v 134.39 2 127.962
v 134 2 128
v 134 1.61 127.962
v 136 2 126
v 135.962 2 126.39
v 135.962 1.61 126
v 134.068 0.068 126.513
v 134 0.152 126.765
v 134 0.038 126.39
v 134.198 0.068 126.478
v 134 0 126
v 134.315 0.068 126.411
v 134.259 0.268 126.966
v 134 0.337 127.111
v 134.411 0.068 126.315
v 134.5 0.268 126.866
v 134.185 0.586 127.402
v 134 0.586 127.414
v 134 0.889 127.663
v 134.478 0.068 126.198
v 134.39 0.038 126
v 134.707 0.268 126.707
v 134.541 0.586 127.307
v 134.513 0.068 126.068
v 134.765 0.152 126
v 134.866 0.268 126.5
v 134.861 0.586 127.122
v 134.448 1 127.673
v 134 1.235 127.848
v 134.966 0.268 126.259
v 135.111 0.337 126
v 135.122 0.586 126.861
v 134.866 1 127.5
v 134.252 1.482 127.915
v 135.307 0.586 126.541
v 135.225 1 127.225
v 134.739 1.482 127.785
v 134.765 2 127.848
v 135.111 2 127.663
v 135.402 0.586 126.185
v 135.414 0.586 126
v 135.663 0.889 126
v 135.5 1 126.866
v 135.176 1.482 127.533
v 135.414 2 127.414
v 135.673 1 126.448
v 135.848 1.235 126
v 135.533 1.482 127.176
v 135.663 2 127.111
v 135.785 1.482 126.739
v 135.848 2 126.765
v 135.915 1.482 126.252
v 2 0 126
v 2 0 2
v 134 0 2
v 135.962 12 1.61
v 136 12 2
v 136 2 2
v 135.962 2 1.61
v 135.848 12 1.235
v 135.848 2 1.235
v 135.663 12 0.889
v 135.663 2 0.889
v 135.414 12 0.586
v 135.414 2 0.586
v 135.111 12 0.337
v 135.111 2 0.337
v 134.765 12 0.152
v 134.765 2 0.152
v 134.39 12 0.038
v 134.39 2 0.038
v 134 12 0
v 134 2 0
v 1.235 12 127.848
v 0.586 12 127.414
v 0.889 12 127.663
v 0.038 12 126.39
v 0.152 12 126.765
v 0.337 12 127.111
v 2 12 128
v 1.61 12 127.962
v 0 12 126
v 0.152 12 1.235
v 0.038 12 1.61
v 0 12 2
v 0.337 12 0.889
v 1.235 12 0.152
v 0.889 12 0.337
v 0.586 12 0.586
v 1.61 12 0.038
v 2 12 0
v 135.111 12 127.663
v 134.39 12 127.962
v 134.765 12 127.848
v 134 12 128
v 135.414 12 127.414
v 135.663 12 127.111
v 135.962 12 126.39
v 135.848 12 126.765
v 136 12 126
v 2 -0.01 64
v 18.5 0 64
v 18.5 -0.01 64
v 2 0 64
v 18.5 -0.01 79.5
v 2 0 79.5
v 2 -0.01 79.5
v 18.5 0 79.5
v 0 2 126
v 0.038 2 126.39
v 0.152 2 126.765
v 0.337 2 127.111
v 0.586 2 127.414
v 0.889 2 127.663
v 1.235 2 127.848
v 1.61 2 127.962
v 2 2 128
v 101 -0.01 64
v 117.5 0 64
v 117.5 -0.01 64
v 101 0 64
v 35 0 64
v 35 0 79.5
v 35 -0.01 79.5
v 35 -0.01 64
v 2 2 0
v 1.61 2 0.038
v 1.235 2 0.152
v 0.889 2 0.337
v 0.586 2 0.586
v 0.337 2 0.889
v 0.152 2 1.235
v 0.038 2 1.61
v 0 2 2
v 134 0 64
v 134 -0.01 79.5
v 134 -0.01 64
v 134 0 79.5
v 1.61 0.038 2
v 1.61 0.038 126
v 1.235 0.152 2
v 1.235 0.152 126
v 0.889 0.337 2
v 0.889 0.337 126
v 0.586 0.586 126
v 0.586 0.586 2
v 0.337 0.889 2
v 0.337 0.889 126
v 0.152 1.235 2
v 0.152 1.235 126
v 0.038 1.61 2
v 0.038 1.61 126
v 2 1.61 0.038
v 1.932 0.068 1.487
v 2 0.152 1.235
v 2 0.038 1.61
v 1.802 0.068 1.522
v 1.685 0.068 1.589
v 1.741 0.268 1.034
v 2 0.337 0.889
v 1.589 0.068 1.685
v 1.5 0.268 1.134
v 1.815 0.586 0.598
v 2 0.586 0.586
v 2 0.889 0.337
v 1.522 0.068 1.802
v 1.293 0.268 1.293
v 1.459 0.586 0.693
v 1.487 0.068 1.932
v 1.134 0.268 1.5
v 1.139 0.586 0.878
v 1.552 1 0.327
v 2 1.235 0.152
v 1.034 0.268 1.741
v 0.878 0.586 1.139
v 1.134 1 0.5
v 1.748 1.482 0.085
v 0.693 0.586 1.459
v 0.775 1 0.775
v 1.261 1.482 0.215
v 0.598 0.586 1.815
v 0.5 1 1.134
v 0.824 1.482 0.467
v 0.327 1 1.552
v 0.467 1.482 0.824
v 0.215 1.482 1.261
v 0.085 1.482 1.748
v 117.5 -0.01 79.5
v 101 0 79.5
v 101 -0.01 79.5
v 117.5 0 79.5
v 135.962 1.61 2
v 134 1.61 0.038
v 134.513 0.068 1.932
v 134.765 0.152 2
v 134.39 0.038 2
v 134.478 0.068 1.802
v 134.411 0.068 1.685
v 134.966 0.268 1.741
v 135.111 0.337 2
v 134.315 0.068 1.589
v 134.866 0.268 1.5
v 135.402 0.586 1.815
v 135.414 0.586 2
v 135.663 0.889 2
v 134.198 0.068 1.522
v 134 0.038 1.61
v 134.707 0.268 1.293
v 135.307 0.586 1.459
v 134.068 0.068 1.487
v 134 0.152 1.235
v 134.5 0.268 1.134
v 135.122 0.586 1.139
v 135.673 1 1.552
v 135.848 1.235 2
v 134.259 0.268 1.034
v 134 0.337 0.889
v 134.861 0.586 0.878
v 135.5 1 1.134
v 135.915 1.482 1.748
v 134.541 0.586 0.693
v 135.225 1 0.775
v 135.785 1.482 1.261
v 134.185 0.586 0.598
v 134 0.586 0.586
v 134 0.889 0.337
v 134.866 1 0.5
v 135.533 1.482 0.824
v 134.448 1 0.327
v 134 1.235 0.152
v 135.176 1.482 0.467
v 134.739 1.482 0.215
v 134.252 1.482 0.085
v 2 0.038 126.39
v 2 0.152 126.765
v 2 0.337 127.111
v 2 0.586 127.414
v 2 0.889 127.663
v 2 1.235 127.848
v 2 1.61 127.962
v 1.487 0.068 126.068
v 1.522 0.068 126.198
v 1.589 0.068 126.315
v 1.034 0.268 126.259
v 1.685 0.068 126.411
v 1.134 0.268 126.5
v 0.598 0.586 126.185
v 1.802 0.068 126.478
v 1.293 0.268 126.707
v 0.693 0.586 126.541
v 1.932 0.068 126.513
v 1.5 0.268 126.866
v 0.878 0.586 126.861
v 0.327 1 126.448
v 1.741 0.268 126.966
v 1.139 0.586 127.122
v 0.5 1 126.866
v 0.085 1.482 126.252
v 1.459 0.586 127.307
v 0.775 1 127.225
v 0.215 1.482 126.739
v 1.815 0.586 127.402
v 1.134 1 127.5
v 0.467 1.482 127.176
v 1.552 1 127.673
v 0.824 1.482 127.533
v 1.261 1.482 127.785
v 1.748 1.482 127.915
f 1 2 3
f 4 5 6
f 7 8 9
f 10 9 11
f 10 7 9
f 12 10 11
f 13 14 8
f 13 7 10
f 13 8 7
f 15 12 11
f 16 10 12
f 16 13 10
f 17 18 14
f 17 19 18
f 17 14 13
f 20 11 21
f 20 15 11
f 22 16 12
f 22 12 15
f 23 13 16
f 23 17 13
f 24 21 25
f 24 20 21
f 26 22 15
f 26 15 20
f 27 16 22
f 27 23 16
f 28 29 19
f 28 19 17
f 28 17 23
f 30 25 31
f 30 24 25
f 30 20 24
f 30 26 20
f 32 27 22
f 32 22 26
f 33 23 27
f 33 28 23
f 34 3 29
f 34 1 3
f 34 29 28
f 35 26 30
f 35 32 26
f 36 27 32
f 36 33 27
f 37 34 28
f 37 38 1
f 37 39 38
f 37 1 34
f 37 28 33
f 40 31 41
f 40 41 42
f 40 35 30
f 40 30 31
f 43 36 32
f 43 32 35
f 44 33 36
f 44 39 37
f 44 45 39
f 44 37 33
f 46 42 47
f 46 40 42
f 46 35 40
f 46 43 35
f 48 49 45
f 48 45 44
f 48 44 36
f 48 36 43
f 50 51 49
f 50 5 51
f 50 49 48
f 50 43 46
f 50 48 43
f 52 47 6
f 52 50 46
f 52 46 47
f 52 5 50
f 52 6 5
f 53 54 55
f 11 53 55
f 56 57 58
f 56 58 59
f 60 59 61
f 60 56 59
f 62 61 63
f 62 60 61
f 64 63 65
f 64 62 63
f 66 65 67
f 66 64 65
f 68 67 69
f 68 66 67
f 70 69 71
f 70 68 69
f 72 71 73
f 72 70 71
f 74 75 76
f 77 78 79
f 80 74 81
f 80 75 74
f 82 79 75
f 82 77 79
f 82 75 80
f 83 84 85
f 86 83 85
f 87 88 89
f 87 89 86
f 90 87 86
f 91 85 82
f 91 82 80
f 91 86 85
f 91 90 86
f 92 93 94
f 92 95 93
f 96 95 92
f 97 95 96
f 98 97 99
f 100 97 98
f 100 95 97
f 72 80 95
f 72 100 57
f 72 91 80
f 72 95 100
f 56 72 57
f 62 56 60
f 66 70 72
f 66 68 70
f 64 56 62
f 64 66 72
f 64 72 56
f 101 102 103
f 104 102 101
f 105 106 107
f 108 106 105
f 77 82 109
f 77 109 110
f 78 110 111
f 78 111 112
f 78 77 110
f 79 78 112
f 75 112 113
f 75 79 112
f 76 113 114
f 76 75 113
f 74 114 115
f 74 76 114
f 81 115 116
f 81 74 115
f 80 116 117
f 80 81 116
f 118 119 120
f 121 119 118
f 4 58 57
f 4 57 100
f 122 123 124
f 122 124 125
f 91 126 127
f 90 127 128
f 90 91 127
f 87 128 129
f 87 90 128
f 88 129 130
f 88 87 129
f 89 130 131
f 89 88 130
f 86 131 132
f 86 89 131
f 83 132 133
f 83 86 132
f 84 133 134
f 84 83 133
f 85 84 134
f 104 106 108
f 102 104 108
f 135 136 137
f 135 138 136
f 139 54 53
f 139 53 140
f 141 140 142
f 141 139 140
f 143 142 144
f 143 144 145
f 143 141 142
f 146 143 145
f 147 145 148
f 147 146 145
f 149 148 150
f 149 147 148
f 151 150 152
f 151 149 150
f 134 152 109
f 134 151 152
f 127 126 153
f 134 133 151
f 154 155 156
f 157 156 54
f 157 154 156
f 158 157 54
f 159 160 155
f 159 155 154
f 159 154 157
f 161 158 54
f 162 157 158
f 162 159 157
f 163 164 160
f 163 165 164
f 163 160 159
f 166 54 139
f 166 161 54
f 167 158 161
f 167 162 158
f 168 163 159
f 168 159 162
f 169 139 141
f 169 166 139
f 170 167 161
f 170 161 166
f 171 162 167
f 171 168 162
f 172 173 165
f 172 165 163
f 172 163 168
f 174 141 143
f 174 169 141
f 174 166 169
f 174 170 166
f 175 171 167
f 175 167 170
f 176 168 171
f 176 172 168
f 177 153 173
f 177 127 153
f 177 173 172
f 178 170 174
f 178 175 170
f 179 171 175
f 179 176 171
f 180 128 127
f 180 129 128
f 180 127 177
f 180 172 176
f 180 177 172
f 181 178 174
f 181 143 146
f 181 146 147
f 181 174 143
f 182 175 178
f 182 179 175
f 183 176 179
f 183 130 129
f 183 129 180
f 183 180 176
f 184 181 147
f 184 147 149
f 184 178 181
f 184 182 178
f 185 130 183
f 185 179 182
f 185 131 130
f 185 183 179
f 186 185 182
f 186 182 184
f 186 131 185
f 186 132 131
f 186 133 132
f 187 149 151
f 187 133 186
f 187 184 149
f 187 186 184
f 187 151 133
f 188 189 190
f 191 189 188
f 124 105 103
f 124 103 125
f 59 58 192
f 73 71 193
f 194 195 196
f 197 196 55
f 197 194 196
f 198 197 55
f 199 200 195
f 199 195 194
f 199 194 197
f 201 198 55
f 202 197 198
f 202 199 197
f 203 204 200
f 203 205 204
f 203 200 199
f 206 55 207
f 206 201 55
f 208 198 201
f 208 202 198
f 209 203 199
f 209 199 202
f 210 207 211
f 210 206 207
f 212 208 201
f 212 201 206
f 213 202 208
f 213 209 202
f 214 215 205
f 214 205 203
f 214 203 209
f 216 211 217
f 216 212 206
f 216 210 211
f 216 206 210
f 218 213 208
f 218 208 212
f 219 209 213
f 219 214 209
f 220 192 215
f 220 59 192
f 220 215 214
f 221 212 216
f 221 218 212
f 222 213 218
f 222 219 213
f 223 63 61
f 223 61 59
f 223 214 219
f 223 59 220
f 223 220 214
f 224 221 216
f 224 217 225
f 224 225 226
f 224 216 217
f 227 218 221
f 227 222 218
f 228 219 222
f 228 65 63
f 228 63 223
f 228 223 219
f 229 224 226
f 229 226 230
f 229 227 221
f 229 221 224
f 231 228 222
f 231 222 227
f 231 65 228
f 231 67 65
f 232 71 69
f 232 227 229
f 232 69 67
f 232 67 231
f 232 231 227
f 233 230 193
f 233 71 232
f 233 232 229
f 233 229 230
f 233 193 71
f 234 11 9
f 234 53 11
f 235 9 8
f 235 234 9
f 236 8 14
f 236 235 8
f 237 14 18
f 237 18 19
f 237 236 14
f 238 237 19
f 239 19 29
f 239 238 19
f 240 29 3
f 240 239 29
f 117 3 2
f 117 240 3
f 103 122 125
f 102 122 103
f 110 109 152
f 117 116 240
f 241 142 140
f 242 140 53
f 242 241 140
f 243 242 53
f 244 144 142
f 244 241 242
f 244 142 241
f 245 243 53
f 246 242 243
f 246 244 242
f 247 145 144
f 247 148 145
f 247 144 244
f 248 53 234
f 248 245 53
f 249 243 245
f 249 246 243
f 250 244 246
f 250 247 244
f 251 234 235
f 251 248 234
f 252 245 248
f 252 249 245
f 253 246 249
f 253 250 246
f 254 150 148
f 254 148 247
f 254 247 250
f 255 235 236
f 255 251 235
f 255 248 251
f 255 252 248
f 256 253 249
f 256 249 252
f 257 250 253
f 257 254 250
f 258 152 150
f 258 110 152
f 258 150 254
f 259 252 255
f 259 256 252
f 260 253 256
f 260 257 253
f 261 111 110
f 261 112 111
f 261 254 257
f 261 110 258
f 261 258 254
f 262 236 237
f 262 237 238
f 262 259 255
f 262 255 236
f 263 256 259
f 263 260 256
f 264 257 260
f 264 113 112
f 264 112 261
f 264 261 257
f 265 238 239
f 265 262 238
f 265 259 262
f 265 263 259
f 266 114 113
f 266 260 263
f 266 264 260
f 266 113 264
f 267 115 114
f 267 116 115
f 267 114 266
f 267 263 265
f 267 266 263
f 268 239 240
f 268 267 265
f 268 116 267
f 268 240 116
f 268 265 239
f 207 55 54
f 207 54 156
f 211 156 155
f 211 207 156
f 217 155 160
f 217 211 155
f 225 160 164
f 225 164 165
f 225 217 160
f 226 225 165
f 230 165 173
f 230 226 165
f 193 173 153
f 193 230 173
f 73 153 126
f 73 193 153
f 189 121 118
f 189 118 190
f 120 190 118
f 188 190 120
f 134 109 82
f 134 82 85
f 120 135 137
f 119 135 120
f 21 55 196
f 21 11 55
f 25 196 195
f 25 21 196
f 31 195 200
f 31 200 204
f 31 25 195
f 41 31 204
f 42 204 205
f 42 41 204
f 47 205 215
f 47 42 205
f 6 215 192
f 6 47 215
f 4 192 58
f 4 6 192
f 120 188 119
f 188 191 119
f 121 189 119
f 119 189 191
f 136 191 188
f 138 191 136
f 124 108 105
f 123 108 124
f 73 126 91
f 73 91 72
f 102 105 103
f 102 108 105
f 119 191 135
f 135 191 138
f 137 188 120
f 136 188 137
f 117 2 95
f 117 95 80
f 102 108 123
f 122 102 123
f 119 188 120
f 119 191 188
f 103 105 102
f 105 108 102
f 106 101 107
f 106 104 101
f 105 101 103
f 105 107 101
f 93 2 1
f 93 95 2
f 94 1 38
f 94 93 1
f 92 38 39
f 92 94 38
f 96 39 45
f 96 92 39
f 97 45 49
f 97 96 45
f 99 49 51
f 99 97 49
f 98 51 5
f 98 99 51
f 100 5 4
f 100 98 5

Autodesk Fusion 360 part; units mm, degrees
sketch "Front Face Plate" plane through (0, 0, 0) normal (0, 1, 0) x (1, 0, 0)
  line L0 (0, 0) -> (136, 0)
  line L1 (136, 0) -> (136, -128)
  line L2 (136, -128) -> (0, -128)
  line L3 (0, -128) -> (0, 0)
  dimension "d5" = 136
  dimension "d6" = 128
extrude "Extrude1" add sketch "Front Face Plate" along normal blind 12 makes body 1
sketch "Eyes" plane through (0, 0, 0) normal (0, -1, 0) x (1, 0, 0)
  line L0 (136, 128) -> (0, 128)
  line L1 (0, 128) -> (0, 0)
  line L2 (0, 0) -> (136, 0)
  line L3 (136, 0) -> (136, 128)
  line L4 (2, 79.5) -> (18.5, 79.5)
  line L5 (18.5, 79.5) -> (18.5, 64)
  line L6 (18.5, 64) -> (2, 64)
  line L7 (2, 64) -> (2, 79.5)
  line L8 (18.5, 79.5) -> (35, 79.5)
  line L9 (35, 79.5) -> (35, 64)
  line L10 (35, 64) -> (18.5, 64)
  line L11 (18.5, 64) -> (18.5, 79.5)
  line L12 (101, 79.5) -> (117.5, 79.5)
  line L13 (117.5, 79.5) -> (117.5, 64)
  line L14 (117.5, 64) -> (101, 64)
  line L15 (101, 64) -> (101, 79.5)
  line L16 (117.5, 79.5) -> (134, 79.5)
  line L17 (134, 79.5) -> (134, 64)
  line L18 (134, 64) -> (117.5, 64)
  line L19 (117.5, 64) -> (117.5, 79.5)
  dimension "d10" = 16.5
  dimension "d11" = 16.5
  dimension "d12" = 16.5
  dimension "d13" = 16.5
  dimension "d14" = 15.5
  dimension "d15" = 15.5
  dimension "d16" = 48.5
  dimension "d17" = 48.5
  dimension "d23" = 2
  dimension "d24" = 2
extrude "Extrude2" add sketch "Eyes" along normal blind 0.01 separate body contours L4 L5 L6 L7 L11 | L13 L16 L17 L18 L19 makes body 2 at (7.5, 0, 74.3333) makes body 3 at (128.5, 0, 69.1667)
extrude "Extrude3" add sketch "Eyes" along normal blind 0.01 separate body contours L5 L8 L9 L10 L11 | L12 L13 L14 L15 L19 makes body 4 at (24, 0, 74.3333) makes body 5 at (106.5, 0, 69.1667)
fillet "Fillet1" radius 2 8 edges at (136, 6, 128) (0, 6, 128) (136, 6, 0) (0, 6, 0) (68, 0, 0) (0, 0, 64) (68, 0, 128) (136, 0, 64) on bodies 1
equation "block_size = 16 mm" comment "The size of the blocks used for the dimensions of the Minecraft Pig."
equation "pine_thickness = 12 mm" comment "The thickness of the pine boards used for the Minecraft Pig's body."
equation "front_face_plate_height = 8 * block_size" comment "The height of the Front Face Plate that makes up the Minecraft Pig's face."
equation "front_face_plate_width = 10 * block_size - 2 * pine_thickness" comment "The width of the Front Face Plate that makes up the Minecraft Pig's face."
equation "d5 = front_face_plate_width"
equation "d6 = front_face_plate_height"
equation "d7 = pine_thickness"
equation "face_block_width = ( front_face_plate_width - 2 * fillet_radius ) / 8" comment "The width of the blocks used for the Minecraft Pig's eyes."
equation "d10 = face_block_width"
equation "d11 = face_block_width"
equation "d12 = face_block_width"
equation "d13 = face_block_width"
equation "d14 = face_block_height"
equation "d15 = face_block_height"
equation "d16 = ( 3 * face_block_height ) + fillet_radius"
equation "d17 = ( 3 * face_block_height ) + fillet_radius"
equation "fillet_radius = 2 mm" comment "The radius of the fillets applied to the Front Face Plate."
equation "d23 = fillet_radius"
equation "d24 = fillet_radius"
equation "d26 = fillet_radius"
equation "face_block_height = ( front_face_plate_height - 2 * fillet_radius ) / 8" comment "The height of the blocks used for the Minecraft Pig's eyes."
